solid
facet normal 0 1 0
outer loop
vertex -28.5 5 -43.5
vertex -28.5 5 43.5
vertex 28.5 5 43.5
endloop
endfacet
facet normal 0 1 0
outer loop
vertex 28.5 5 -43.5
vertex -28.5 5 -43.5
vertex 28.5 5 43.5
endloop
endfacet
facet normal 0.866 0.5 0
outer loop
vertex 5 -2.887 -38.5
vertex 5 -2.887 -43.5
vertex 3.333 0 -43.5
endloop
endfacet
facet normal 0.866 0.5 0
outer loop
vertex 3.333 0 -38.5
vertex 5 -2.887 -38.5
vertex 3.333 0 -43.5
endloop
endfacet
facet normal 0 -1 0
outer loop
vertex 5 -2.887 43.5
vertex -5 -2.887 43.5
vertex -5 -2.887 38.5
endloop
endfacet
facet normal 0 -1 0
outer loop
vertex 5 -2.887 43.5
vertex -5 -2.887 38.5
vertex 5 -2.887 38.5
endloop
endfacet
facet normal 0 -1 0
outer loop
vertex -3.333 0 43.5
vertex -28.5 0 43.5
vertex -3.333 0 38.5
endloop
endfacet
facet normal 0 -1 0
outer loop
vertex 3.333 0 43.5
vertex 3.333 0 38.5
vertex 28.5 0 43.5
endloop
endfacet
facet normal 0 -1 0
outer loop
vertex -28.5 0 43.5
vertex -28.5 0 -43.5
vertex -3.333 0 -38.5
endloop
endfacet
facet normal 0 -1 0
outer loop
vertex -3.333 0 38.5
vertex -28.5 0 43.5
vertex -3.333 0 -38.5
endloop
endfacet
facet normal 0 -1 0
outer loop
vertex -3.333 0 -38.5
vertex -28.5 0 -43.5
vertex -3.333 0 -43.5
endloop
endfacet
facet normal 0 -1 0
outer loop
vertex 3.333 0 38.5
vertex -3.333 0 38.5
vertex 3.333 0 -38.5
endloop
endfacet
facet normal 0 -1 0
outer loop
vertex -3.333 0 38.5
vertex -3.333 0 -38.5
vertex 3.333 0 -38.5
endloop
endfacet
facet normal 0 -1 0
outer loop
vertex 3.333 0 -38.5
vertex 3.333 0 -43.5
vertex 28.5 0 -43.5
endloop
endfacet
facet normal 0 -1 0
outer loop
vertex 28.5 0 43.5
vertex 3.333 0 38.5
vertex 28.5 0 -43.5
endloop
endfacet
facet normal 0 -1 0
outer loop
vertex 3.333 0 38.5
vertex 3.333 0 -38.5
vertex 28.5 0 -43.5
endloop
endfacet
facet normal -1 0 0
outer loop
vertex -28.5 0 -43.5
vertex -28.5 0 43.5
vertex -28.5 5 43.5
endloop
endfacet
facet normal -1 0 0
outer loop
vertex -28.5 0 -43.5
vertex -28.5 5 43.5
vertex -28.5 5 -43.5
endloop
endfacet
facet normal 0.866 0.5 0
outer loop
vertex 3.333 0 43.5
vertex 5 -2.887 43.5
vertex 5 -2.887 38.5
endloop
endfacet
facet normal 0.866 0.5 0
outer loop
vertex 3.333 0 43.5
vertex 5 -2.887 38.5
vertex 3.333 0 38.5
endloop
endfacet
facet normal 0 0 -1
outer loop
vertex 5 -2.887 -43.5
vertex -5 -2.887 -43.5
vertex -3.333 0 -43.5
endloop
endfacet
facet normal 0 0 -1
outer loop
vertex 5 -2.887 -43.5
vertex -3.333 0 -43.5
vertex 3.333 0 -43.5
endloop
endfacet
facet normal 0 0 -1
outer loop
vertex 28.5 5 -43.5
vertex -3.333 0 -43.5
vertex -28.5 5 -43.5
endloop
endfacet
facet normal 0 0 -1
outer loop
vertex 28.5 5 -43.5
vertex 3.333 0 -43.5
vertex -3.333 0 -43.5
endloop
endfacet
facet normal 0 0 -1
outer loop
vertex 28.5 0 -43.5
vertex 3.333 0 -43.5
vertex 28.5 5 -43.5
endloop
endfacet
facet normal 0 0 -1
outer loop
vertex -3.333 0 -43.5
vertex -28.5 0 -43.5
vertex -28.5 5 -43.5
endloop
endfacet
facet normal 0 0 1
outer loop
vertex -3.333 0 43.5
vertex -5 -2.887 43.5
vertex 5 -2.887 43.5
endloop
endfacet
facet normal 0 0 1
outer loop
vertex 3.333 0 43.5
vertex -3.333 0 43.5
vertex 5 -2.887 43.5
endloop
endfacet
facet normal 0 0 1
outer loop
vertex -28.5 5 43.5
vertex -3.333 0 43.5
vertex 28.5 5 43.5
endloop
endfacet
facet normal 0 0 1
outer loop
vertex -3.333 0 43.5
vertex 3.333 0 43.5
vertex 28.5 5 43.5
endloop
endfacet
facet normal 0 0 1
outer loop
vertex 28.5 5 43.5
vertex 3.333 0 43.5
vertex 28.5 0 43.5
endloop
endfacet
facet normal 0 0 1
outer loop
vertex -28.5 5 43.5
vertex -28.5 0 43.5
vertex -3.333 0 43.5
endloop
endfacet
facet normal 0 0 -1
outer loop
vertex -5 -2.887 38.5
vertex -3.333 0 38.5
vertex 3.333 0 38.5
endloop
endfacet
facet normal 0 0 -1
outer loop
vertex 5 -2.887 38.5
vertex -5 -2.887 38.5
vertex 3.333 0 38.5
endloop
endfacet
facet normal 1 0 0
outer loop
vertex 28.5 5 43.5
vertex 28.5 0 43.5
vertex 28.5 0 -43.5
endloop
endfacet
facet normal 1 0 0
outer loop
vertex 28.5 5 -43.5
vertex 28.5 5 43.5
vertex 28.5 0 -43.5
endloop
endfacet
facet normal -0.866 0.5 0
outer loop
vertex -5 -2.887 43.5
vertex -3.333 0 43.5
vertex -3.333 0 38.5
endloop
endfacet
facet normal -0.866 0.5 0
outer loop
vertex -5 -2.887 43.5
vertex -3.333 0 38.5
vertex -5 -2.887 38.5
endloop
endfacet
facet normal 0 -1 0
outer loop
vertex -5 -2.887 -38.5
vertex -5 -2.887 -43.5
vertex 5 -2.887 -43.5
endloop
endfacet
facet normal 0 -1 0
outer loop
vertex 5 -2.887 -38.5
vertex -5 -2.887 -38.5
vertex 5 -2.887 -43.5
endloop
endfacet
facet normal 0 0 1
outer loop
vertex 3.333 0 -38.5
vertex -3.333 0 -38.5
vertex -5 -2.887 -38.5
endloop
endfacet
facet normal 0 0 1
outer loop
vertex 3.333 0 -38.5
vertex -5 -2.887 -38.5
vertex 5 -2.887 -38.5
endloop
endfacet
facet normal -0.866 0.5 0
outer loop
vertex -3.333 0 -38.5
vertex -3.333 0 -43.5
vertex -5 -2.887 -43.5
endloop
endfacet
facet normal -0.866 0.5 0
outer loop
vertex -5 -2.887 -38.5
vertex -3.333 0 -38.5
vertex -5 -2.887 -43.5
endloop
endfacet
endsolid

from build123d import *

# Parameters (mm, degrees)
SKETCH1_W           = 57
SKETCH1_H           = 87
BOSS_EXTRUDE1_DEPTH = 5
BOSS_EXTRUDE2_DEPTH = 5
BOSS_EXTRUDE3_START = -87
BOSS_EXTRUDE3_DEPTH = 5


with BuildPart() as part:
    # Sketch1 → Boss-Extrude1 (new body)
    with BuildSketch(Plane(origin=(0, 0, 0), x_dir=(1, 0, 0), z_dir=(0, 1, 0))):
        Rectangle(SKETCH1_W, SKETCH1_H)
    extrude(amount=BOSS_EXTRUDE1_DEPTH)

    # Sketch2 → Boss-Extrude2 (add)
    with BuildSketch(Plane.XY.offset(43.5)):
        Polygon((3.333333333, 0), (-3.333333333, 0), (-5, -2.886751346), (5, -2.886751346), align=None)
    extrude(amount=-BOSS_EXTRUDE2_DEPTH)

    # Sketch2<3> → Boss-Extrude3 (add)
    with BuildSketch(Plane.XY.offset(43.5).offset(BOSS_EXTRUDE3_START)):
        Polygon((3.333333333, 0), (-3.333333333, 0), (-5, -2.886751346), (5, -2.886751346), align=None)
    extrude(amount=BOSS_EXTRUDE3_DEPTH)


solid = part.part
